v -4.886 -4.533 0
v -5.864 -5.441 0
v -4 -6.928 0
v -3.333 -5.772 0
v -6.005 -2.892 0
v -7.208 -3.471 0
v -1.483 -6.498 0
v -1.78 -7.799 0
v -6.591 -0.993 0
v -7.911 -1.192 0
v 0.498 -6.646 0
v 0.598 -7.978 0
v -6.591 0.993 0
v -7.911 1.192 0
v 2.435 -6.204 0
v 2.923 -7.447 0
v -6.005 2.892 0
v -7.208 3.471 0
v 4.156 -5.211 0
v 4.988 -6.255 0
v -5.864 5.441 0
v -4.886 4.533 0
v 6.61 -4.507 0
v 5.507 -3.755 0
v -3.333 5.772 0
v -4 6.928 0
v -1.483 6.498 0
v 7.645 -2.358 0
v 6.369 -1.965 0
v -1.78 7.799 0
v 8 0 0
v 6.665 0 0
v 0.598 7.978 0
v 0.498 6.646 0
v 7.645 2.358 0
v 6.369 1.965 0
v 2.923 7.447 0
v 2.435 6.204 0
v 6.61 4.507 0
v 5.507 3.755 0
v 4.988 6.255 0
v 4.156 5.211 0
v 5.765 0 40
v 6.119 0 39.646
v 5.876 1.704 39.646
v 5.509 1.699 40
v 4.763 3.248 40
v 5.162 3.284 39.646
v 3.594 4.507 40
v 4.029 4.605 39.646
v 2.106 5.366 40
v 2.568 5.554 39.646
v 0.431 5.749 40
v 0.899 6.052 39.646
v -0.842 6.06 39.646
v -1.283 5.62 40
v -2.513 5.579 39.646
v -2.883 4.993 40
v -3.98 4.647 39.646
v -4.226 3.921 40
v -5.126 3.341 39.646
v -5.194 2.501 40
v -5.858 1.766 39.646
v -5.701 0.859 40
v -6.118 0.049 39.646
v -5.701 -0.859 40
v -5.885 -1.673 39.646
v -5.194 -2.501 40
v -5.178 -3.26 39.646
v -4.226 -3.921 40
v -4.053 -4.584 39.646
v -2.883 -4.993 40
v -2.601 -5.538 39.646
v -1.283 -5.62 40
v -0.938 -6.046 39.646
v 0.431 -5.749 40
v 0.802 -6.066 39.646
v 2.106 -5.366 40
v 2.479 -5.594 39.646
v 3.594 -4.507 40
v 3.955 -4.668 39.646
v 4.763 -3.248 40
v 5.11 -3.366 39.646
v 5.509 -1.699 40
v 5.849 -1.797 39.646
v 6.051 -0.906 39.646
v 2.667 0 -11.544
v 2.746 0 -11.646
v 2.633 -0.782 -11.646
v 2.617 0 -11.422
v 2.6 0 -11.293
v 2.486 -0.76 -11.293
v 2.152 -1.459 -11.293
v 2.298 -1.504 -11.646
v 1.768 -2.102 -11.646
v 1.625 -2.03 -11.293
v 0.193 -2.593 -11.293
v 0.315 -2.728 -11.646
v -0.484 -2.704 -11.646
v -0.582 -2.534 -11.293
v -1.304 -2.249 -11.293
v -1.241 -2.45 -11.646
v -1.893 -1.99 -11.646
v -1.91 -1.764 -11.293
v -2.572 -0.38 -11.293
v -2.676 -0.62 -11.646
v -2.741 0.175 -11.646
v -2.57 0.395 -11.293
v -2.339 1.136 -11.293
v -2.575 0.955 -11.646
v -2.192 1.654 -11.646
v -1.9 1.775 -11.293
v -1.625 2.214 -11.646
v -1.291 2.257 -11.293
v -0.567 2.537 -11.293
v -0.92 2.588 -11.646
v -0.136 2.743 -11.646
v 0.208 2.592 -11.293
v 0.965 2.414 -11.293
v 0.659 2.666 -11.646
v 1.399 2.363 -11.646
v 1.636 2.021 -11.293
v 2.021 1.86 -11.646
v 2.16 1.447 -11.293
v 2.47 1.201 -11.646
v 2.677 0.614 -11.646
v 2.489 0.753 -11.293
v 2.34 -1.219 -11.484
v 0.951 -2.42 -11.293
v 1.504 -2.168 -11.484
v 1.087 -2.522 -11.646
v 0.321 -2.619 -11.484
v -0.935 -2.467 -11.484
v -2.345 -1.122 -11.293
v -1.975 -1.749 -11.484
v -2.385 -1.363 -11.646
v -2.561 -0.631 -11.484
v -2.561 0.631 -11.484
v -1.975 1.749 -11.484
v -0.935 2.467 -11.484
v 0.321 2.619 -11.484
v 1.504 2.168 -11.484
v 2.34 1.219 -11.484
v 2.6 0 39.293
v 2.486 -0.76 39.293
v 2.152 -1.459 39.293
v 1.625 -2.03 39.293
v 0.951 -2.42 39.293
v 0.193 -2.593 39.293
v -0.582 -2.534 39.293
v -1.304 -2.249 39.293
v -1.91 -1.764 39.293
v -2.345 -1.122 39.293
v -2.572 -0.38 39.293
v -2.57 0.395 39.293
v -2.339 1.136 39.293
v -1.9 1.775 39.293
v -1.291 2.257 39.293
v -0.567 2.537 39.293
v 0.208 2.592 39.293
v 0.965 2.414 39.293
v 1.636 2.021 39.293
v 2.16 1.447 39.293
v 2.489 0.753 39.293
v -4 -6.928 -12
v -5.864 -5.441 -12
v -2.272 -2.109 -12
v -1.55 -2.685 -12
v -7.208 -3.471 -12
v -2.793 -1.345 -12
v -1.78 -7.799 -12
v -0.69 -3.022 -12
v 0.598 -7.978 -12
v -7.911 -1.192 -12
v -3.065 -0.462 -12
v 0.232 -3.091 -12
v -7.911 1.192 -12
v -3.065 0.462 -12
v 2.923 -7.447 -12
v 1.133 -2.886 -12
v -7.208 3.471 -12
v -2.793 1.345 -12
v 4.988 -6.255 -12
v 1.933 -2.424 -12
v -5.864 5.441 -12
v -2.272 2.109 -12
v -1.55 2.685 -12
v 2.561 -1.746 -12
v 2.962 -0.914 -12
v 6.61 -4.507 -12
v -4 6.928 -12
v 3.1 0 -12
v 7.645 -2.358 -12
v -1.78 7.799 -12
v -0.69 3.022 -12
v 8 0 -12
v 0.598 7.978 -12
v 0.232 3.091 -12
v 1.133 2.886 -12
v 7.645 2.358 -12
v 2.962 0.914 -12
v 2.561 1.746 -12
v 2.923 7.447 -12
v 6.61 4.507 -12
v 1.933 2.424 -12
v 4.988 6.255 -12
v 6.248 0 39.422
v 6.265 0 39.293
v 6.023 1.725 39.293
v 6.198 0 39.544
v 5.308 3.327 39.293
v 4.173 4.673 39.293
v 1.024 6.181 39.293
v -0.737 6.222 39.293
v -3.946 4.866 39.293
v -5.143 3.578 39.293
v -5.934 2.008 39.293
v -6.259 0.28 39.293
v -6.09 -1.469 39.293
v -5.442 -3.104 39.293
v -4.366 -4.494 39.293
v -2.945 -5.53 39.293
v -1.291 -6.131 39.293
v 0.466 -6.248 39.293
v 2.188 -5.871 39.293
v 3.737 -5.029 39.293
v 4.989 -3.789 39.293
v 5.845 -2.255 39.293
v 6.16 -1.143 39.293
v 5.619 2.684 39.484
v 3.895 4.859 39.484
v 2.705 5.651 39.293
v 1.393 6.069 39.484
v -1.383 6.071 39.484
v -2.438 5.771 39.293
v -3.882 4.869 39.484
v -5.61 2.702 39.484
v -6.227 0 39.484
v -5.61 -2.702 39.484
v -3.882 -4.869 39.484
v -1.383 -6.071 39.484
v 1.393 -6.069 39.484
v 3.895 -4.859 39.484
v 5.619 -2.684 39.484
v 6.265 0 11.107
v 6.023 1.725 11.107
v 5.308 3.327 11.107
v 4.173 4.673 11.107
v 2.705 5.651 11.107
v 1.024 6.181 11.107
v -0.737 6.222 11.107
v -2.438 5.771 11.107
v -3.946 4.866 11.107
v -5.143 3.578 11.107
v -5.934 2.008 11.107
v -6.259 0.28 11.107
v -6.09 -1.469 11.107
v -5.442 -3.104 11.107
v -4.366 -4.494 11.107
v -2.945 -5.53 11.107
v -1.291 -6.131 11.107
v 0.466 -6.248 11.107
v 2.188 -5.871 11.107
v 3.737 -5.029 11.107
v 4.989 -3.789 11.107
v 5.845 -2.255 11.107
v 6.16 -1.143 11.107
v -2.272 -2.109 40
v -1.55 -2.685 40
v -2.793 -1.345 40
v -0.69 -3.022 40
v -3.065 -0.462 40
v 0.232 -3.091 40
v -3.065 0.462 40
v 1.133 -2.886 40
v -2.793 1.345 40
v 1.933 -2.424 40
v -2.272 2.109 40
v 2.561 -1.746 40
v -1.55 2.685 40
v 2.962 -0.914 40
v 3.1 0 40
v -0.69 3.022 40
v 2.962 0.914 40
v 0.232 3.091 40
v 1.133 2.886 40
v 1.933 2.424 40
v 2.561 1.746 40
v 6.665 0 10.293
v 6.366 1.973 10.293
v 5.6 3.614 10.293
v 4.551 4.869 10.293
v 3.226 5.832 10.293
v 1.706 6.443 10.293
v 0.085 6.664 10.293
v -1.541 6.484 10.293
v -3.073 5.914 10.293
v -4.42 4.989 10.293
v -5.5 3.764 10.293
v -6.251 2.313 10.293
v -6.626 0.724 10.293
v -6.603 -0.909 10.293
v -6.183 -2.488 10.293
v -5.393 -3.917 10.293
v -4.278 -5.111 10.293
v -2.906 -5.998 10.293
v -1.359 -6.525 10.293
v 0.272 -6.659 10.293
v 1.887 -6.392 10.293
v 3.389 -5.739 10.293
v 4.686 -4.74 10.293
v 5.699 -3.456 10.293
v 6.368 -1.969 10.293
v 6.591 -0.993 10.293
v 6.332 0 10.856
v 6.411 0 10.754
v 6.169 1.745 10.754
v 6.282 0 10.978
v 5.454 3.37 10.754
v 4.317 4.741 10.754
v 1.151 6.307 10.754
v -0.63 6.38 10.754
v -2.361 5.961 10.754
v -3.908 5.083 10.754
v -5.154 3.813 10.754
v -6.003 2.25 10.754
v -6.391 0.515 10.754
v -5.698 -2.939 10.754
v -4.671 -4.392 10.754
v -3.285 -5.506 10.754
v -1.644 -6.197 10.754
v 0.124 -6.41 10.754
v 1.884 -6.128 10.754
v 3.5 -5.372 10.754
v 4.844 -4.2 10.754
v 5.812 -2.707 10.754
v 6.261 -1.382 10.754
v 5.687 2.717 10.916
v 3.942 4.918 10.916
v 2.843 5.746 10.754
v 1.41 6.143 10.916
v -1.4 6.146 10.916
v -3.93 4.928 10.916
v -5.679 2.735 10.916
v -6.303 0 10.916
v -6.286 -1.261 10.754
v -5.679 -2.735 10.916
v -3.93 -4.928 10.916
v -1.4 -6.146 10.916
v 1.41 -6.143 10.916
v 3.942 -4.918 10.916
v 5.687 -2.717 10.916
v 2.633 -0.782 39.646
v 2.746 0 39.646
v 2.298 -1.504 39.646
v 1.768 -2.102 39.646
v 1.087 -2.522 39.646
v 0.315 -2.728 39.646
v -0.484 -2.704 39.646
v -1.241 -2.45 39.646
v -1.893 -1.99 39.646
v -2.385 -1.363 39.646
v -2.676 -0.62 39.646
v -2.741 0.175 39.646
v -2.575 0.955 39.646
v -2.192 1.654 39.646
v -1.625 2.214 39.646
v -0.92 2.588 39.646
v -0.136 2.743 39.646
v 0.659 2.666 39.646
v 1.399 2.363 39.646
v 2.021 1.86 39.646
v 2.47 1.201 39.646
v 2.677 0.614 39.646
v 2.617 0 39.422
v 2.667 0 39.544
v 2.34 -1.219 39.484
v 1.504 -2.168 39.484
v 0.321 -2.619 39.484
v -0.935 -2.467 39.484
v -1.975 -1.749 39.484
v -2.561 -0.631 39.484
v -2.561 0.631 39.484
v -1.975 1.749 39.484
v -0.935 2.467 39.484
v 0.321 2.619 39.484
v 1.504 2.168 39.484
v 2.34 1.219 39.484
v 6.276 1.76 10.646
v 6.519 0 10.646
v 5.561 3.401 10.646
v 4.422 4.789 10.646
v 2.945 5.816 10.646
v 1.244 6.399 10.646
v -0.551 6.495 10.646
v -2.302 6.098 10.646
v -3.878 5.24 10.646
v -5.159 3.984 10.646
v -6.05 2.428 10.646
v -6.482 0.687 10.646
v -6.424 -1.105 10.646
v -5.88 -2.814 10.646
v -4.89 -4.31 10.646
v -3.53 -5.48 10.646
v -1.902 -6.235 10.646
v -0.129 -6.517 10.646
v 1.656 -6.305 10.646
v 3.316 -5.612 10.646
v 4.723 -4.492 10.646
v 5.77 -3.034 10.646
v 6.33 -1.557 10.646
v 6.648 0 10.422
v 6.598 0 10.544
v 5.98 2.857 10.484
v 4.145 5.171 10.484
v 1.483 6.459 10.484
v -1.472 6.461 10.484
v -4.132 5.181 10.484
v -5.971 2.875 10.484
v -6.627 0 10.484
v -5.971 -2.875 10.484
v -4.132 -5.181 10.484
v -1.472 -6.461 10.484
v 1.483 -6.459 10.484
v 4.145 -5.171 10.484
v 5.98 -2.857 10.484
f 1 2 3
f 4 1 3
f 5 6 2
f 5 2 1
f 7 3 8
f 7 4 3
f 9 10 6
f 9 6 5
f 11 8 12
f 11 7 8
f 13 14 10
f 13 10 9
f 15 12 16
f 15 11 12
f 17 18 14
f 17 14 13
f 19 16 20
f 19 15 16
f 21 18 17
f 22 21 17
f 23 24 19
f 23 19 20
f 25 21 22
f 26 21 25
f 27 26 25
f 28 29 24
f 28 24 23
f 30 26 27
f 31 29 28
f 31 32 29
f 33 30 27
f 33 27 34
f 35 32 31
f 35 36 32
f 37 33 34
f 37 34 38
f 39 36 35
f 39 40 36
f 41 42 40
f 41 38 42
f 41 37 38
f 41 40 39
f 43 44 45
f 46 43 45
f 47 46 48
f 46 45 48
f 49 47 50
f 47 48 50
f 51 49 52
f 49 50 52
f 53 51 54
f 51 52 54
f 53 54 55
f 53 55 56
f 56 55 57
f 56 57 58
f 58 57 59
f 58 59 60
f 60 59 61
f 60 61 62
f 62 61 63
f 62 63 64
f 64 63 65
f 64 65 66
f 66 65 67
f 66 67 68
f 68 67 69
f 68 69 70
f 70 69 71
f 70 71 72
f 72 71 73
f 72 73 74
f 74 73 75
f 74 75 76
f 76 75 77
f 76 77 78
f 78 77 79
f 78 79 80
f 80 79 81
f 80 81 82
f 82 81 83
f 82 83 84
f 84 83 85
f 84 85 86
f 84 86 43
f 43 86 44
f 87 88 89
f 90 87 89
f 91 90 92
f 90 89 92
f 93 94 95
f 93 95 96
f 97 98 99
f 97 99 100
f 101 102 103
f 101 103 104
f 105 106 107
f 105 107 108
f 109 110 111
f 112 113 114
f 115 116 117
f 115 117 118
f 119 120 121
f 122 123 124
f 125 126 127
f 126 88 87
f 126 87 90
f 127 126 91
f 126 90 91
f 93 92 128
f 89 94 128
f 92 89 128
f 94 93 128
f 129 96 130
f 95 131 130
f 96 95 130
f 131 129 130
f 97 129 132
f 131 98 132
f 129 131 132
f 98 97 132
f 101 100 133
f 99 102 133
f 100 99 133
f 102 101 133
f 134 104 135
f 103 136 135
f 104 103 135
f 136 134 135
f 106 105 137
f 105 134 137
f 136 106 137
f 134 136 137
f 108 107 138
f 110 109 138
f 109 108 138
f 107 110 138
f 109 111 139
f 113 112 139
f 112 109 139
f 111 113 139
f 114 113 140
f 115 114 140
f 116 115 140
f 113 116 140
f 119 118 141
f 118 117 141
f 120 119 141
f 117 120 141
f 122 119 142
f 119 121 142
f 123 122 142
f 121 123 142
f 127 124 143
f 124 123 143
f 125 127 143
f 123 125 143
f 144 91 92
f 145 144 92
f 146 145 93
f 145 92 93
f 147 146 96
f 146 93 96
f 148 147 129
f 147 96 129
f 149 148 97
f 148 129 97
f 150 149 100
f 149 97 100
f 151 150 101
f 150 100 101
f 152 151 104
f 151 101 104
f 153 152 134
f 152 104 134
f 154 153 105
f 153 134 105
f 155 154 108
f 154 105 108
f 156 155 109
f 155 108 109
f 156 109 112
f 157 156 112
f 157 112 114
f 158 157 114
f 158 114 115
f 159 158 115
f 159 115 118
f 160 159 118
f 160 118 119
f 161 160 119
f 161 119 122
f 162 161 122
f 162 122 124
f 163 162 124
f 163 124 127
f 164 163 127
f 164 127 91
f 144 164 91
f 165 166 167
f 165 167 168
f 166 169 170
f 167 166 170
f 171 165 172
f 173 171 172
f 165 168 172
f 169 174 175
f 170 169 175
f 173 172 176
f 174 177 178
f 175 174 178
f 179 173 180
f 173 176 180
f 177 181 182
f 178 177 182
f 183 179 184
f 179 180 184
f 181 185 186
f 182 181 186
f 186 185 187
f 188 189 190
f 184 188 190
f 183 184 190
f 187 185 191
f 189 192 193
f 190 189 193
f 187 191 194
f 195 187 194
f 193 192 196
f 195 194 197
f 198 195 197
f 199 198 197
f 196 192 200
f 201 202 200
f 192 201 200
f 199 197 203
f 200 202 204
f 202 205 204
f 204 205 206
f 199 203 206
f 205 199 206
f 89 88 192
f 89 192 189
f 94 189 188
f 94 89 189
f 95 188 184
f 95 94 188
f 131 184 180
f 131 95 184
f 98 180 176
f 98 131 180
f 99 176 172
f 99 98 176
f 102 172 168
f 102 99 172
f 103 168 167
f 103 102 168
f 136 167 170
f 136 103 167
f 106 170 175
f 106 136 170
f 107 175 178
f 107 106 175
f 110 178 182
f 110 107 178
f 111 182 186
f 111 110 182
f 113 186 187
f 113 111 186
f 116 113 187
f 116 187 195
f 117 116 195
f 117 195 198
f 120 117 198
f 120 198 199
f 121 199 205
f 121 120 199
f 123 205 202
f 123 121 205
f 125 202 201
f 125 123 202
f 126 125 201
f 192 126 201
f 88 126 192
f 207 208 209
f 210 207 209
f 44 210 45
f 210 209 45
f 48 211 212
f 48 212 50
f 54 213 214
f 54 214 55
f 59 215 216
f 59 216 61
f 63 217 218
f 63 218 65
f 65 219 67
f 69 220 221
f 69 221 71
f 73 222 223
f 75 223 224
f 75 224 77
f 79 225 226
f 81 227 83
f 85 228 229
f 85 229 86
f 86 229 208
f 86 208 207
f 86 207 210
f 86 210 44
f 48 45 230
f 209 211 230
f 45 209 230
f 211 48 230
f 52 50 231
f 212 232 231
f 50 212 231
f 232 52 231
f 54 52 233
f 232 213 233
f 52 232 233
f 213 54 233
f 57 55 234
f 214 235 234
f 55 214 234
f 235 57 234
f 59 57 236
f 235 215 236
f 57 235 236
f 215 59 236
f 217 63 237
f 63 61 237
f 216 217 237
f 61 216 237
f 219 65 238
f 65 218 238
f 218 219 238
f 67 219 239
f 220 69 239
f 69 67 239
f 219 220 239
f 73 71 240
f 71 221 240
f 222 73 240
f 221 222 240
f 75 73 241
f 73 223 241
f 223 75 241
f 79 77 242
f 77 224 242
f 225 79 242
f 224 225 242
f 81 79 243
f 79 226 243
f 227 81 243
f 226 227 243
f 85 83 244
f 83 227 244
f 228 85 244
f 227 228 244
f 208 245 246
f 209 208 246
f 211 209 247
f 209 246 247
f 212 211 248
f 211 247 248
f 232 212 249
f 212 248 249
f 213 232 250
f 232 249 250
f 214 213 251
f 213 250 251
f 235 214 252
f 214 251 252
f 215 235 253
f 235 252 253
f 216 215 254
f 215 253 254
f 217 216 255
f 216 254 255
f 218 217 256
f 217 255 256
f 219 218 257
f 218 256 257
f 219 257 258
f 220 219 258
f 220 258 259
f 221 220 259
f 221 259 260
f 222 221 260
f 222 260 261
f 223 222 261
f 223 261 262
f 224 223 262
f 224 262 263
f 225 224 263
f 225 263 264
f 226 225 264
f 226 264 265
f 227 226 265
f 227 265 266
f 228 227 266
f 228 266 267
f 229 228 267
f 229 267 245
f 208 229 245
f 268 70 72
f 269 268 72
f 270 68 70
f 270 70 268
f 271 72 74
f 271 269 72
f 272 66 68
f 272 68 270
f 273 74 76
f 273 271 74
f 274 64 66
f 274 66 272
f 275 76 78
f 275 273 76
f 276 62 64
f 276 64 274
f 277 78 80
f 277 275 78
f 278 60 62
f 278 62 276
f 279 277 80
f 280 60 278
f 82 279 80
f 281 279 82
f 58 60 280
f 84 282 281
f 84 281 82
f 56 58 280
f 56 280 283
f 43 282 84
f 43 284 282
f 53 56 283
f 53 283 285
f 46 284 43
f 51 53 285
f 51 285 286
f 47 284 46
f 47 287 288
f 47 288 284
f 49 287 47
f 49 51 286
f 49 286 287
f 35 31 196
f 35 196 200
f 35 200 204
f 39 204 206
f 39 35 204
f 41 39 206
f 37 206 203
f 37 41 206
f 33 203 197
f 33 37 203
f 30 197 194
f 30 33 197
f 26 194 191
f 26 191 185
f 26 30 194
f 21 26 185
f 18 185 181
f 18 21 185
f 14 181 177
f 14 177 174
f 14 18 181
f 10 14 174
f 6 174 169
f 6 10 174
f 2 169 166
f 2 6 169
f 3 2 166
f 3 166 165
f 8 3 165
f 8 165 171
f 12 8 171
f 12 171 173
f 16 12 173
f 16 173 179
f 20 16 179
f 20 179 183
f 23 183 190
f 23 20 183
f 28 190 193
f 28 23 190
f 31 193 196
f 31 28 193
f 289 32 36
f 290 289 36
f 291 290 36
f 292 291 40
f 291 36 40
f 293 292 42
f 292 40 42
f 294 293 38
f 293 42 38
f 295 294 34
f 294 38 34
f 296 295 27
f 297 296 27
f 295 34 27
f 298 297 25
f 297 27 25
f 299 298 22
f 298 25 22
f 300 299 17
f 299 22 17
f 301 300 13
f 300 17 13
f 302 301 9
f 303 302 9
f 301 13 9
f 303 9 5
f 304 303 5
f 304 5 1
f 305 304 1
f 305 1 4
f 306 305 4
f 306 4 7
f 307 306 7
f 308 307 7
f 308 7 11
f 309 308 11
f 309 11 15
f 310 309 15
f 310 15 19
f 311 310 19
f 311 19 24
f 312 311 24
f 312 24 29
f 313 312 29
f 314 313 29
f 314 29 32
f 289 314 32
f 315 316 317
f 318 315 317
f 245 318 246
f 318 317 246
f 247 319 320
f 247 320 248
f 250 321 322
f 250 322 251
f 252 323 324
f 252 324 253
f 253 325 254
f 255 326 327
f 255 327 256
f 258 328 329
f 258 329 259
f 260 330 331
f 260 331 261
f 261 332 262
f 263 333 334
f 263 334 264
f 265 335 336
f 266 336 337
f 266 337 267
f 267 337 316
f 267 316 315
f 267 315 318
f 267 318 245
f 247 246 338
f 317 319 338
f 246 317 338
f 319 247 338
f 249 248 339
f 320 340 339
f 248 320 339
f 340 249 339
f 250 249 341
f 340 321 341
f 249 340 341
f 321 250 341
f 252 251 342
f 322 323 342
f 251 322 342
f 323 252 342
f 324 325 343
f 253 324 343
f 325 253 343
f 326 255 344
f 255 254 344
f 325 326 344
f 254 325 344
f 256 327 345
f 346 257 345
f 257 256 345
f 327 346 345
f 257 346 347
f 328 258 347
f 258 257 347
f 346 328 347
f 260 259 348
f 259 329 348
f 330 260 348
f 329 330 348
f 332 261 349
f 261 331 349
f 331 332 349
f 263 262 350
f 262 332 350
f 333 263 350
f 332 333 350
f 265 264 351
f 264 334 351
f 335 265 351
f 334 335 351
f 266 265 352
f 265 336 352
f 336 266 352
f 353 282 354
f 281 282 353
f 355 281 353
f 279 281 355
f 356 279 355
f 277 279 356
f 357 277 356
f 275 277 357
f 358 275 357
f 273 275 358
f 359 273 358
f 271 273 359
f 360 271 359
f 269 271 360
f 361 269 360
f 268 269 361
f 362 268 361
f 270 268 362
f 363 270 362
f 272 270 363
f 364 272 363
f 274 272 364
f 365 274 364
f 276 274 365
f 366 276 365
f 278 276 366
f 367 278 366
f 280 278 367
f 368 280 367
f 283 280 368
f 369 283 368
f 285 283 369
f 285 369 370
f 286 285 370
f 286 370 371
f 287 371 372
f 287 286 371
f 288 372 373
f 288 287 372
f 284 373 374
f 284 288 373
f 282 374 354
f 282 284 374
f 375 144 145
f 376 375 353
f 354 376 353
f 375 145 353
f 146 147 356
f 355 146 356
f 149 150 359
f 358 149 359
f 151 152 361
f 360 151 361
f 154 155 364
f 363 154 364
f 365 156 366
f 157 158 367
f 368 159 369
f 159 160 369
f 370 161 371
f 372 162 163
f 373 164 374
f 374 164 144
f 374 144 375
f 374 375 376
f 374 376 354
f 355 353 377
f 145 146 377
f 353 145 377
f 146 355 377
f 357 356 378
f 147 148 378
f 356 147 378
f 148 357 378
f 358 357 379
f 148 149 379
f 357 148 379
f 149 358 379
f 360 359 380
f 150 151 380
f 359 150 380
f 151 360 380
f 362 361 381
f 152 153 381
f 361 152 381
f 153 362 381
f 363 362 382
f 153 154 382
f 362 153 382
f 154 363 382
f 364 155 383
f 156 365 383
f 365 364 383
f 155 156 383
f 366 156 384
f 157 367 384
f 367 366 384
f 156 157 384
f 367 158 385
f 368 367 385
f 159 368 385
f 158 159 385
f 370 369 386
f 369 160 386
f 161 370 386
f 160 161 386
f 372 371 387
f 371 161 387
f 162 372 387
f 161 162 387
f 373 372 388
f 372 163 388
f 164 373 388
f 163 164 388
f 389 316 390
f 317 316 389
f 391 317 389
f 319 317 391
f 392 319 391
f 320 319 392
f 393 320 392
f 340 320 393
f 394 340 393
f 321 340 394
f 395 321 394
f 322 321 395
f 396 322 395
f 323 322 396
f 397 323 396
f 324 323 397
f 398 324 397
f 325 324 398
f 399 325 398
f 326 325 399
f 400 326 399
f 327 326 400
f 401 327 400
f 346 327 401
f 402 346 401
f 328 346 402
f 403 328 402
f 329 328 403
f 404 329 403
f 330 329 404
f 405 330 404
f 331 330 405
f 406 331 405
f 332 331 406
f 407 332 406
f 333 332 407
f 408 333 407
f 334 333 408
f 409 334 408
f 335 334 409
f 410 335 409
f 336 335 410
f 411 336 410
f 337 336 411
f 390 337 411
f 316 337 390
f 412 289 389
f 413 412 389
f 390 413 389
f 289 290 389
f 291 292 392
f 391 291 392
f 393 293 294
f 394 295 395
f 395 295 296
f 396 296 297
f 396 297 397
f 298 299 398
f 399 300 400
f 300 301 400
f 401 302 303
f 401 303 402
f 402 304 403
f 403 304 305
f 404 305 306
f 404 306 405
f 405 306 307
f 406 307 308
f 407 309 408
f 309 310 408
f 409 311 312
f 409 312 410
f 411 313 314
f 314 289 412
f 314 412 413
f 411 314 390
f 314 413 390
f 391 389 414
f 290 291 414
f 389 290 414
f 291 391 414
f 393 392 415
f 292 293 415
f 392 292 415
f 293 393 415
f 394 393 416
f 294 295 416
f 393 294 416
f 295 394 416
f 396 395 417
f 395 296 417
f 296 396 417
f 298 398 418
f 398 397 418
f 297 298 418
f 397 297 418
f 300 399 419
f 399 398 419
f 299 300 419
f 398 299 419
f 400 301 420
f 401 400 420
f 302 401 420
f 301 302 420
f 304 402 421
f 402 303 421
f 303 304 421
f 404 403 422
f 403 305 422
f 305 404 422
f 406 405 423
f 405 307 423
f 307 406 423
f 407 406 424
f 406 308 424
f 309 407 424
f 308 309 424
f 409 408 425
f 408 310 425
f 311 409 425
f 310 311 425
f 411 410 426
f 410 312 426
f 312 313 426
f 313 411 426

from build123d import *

# Parameters (mm, degrees)
F0_R        = 6.665
F0_R_2      = 6.265
F1_DEPTH    = 11
F2_DEPTH    = 40
F0_R_3      = 8
F3_DEPTH    = 12
F4_R        = 2.6
F5_DEPTH    = 52
F6_S5_R     = 6.265
F6_T6_DEPTH = 11
F7_R        = 0.5
F8_R        = 0.5


# Not quite as in the source:
# - a fillet or chamfer that OpenCascade refuses, or shapes differently, is made with other operations: its cross-section is extruded or revolved along the edge and cut away or added


with BuildPart() as f1:
    # F0 (on Top) → F1 (new body)
    with BuildSketch(Plane.XY):
        Circle(F0_R)
        Circle(F0_R_2, mode=Mode.SUBTRACT)
        Circle(F0_R_2)
    extrude(amount=F1_DEPTH)

    # F0 (on Top) → F2 (join)
    with BuildSketch(Plane.XY):
        Circle(F0_R_2)
    extrude(amount=F2_DEPTH)

    # F0 (on Top) → F3 (join)
    with BuildSketch(Plane.XY):
        Circle(F0_R_3)
        Circle(F0_R, mode=Mode.SUBTRACT)
        Circle(F0_R)
        Circle(F0_R_2, mode=Mode.SUBTRACT)
        Circle(F0_R_2)
    extrude(amount=-F3_DEPTH)

    # F4 (on face) → F5 (cut)
    with BuildSketch(Plane(origin=(0, 0, -12), x_dir=(1, 0, 0), z_dir=(0, 0, -1))):
        Circle(F4_R)
    extrude(amount=-F5_DEPTH, mode=Mode.SUBTRACT)

    # F6: chamfer of 0.5 on 4 edges, made by hand


with BuildPart() as f6_tool2:
    # F6_s3 → F6_t4 (revolve)
    with BuildSketch(Plane.XZ):
        Polygon((6.665, 10.5), (6.165, 11), (6.665, 11), align=None)
    revolve(axis=Axis((0, 0, 11), (0, 0, 1)))

    # F6_s5 → F6_t6 (cut, symmetric)
    with BuildSketch(Plane.XY.offset(10.8)):
        Circle(F6_S5_R)
    extrude(amount=F6_T6_DEPTH, both=True, mode=Mode.SUBTRACT)


with BuildPart() as f1_1:
    add(f1.part)

    # F6_t1: cut F6_tool2
    add(f6_tool2.part, mode=Mode.SUBTRACT)

    # F6_s7 → F6_t8 (revolve, cut)
    with BuildSketch(Plane.XZ):
        Polygon((5.765, 40), (6.265, 39.5), (6.265, 40), align=None)
    revolve(axis=Axis((0, 0, 40), (0, 0, 1)), mode=Mode.SUBTRACT)

    # F6_s9 → F6_t10 (revolve, cut)
    with BuildSketch(Plane.XZ):
        Polygon((2.6, 39.5), (3.1, 40), (2.6, 40), align=None)
    revolve(axis=Axis((0, 0, 40), (0, 0, -1)), mode=Mode.SUBTRACT)

    # F6_s11 → F6_t12 (revolve, cut)
    with BuildSketch(Plane.XZ):
        Polygon((3.1, -12), (2.6, -11.5), (2.6, -12), align=None)
    revolve(axis=Axis((0, 0, -12), (0, 0, -1)), mode=Mode.SUBTRACT)

    # F7
    f7_edges = [f1_1.edges().sort_by_distance(p)[0] for p in [
        (-6.665, 0, 10.5),
        (-6.265, 0, 39.5),
        (-2.6, 0, 39.5),
        (-2.6, 0, -11.5),
    ]]
    fillet(f7_edges, radius=F7_R)

    # F8
    f8_edges = [f1_1.edges().sort_by_distance(p)[0] for p in [
        (-6.265, 0, 10.9),
    ]]
    fillet(f8_edges, radius=F8_R)


solid = f1_1.part
